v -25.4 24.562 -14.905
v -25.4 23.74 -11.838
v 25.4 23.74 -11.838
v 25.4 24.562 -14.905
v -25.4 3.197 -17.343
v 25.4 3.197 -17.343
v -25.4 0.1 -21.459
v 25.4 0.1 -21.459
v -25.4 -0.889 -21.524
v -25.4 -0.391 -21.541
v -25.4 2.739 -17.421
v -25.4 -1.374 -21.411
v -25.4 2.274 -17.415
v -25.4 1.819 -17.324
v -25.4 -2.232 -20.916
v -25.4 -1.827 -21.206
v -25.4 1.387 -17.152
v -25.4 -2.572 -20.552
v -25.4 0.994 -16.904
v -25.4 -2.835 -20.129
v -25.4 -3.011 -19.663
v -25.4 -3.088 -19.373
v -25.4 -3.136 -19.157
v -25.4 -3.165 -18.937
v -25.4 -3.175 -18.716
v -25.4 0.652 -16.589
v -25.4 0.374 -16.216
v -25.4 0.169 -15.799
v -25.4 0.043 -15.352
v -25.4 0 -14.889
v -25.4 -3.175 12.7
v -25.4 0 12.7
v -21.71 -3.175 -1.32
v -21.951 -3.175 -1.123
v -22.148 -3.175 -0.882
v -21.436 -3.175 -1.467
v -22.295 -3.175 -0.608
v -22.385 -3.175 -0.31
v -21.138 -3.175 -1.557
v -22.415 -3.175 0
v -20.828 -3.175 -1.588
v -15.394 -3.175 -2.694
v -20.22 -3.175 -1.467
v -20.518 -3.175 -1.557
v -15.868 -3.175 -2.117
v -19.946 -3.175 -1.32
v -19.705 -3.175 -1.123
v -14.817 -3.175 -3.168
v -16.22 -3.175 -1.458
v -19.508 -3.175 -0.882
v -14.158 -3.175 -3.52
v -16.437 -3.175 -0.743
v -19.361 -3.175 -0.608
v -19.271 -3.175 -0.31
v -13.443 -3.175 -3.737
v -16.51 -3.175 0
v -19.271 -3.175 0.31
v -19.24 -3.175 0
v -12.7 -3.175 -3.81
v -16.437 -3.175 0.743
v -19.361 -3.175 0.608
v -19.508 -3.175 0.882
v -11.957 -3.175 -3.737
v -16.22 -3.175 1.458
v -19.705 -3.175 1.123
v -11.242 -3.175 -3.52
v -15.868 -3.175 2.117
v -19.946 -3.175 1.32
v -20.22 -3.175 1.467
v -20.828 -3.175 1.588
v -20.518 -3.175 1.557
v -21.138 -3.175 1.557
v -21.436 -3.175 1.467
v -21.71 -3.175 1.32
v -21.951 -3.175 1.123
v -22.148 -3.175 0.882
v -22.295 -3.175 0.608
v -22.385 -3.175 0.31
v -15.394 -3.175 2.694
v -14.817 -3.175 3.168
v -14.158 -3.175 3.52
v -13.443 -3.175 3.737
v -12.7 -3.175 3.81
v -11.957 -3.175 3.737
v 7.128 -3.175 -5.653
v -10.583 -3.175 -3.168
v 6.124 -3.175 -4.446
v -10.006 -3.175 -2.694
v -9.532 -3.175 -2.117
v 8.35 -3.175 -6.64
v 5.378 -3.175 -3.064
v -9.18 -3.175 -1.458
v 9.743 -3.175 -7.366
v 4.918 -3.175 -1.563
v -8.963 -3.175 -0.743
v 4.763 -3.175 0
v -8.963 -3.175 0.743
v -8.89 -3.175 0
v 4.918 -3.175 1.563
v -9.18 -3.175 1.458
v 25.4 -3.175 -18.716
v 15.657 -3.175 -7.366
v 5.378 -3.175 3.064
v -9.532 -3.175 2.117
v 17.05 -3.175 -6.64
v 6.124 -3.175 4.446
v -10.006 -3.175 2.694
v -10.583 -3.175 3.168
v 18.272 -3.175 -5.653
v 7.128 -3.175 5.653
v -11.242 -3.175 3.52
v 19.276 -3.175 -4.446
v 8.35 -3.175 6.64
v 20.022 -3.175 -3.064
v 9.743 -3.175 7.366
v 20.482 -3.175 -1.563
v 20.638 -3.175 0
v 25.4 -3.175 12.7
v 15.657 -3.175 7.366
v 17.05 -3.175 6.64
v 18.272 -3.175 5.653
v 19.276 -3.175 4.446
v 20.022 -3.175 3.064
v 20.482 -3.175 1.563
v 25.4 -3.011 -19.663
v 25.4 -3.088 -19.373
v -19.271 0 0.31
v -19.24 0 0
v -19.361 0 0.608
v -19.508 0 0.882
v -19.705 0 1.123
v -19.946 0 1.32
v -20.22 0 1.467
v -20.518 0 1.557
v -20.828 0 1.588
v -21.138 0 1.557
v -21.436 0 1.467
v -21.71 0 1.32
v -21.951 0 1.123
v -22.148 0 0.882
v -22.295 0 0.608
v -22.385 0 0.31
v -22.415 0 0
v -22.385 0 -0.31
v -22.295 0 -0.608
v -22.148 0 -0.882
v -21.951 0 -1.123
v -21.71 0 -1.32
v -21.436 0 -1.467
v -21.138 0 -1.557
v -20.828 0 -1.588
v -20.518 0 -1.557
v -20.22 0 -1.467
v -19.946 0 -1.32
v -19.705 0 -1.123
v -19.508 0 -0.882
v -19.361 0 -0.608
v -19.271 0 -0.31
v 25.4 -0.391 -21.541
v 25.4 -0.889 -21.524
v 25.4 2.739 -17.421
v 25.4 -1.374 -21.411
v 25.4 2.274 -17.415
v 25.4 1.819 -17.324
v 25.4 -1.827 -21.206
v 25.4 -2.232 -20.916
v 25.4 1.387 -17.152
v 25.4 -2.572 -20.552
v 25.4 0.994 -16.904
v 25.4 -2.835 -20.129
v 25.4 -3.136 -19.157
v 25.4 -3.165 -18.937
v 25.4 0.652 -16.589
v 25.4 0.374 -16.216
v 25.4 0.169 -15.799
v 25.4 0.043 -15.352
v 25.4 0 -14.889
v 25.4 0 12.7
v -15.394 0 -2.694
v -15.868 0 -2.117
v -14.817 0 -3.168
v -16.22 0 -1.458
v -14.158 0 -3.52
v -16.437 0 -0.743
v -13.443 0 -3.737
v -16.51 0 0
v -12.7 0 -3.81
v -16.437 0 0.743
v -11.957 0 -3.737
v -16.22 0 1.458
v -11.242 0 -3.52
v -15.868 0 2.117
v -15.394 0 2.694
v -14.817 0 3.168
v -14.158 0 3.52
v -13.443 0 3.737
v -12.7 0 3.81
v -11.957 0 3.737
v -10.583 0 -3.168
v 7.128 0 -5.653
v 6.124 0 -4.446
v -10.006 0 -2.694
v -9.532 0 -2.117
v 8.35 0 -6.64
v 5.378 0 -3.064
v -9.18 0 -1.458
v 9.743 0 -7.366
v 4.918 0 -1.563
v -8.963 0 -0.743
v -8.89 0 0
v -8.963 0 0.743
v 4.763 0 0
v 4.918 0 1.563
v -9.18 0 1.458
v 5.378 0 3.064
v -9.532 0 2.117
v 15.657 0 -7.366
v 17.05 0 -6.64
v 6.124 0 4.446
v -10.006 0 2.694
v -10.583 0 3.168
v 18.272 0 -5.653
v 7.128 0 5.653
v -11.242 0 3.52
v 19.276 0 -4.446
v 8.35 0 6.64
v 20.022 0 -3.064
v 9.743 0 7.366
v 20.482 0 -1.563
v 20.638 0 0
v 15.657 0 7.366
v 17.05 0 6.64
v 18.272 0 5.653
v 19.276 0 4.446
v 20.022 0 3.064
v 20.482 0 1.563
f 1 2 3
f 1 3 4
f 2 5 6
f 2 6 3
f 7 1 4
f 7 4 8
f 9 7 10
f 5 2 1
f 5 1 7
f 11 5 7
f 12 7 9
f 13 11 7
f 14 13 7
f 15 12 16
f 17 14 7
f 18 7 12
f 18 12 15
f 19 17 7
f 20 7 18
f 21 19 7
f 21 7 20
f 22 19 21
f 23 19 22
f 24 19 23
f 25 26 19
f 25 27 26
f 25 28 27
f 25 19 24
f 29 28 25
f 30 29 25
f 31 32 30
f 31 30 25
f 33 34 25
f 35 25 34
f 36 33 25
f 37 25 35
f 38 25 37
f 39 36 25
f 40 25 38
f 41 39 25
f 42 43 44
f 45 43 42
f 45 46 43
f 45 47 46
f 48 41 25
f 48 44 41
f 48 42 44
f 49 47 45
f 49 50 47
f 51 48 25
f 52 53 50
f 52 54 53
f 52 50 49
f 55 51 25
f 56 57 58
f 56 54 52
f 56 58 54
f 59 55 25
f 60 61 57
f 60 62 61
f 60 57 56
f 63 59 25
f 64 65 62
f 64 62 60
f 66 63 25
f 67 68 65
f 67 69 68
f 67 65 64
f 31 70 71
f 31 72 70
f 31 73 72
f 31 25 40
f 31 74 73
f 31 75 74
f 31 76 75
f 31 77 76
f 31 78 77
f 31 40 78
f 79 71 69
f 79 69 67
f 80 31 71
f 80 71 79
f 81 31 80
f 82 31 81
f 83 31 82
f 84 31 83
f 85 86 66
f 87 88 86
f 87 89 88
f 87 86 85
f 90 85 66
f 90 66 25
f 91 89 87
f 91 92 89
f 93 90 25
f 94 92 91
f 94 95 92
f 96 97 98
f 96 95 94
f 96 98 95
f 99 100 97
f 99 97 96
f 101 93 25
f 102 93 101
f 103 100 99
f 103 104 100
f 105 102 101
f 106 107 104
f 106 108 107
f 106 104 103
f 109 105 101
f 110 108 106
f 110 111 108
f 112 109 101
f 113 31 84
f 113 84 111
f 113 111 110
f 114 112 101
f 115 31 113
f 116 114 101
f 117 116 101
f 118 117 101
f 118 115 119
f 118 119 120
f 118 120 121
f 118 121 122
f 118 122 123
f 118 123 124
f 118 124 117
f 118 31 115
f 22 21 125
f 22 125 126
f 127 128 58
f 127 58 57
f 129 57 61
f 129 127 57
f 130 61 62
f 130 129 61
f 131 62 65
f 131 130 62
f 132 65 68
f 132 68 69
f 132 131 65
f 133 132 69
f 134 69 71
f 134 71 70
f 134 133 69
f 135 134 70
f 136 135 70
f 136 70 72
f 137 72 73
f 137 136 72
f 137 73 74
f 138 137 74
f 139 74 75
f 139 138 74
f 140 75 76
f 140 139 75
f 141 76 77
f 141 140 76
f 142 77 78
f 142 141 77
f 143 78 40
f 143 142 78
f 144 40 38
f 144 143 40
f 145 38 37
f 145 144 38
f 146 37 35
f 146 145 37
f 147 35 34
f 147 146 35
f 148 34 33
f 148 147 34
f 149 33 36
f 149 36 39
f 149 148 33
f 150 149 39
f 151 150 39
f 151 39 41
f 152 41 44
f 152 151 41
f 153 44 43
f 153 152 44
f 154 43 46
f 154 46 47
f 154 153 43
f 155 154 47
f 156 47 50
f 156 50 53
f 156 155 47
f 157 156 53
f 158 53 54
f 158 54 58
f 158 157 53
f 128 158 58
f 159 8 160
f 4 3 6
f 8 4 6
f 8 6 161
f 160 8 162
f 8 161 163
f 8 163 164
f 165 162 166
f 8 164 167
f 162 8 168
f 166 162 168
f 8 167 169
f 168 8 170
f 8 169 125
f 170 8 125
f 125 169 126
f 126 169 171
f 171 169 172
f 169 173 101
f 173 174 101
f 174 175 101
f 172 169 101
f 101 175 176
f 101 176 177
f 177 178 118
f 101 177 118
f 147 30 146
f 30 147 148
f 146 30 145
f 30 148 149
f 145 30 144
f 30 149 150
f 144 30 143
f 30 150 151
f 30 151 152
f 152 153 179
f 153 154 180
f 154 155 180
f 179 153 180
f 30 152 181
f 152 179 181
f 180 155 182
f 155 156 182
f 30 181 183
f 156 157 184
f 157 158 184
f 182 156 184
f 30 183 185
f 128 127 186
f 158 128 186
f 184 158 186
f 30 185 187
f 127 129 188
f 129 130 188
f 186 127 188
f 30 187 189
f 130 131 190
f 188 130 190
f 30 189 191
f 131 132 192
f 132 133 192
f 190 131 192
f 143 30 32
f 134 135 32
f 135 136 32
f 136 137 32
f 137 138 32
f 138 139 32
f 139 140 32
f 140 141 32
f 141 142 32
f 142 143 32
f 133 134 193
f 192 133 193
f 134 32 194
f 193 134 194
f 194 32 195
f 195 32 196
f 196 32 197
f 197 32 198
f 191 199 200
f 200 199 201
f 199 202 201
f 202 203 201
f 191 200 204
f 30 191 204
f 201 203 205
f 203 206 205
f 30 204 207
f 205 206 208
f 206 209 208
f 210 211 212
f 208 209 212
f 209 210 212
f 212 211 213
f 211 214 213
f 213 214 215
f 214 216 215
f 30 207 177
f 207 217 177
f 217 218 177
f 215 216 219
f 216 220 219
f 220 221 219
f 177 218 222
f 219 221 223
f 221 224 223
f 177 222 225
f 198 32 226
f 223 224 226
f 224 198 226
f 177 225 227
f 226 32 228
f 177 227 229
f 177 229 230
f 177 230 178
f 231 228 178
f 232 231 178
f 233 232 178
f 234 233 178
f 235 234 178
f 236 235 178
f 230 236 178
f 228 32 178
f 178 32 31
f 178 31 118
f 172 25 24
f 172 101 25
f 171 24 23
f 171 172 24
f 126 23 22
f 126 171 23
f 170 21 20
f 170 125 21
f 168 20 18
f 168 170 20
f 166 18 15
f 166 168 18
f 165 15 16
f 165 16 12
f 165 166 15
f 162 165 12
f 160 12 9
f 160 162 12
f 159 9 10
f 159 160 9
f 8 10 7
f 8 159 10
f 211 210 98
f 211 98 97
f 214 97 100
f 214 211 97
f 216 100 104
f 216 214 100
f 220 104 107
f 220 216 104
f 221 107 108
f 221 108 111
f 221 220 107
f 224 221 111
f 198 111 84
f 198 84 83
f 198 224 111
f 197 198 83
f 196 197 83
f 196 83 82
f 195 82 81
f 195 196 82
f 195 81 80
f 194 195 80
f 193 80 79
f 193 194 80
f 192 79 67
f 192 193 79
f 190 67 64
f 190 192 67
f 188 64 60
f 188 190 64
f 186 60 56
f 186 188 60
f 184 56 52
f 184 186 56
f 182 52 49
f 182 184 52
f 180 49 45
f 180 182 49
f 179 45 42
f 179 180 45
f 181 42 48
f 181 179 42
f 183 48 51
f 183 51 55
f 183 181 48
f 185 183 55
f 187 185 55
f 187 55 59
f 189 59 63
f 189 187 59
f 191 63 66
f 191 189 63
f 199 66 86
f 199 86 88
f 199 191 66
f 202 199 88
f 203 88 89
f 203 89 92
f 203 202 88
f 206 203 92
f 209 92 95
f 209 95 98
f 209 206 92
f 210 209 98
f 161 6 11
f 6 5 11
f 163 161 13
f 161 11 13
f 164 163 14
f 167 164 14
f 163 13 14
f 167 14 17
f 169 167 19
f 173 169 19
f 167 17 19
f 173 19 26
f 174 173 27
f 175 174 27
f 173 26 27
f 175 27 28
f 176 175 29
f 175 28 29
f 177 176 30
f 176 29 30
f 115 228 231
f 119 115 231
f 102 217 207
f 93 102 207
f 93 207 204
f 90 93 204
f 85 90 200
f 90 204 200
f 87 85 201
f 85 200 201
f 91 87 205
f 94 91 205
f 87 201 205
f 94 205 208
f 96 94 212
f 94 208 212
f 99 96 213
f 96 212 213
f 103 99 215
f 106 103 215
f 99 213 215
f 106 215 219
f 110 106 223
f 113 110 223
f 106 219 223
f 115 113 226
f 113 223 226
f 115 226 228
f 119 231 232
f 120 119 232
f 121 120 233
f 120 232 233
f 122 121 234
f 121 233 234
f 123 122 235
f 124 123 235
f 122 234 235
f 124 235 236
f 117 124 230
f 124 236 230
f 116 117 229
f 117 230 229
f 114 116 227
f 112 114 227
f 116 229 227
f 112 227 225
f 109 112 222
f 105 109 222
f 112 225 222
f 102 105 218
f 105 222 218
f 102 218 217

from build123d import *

# Parameters (mm, degrees)
F0_W     = 50.8
F0_H     = 31.75
F0_R     = 1.5875
F0_R_2   = 3.81
F1_DEPTH = 3.175
F3_DEPTH = 50.8
F4_R     = 2.54
F5_R     = 2.54


with BuildPart() as f1:
    # F0 (on Front) → F1 (new body)
    with BuildSketch(Plane.XZ):
        with Locations((0, -3.175)):
            Rectangle(F0_W, F0_H)
        with Locations((-20.828, 0)):
            Circle(F0_R, mode=Mode.SUBTRACT)
        with Locations((-12.7, 0)):
            Circle(F0_R_2, mode=Mode.SUBTRACT)
        with BuildLine():
            ThreePointArc((9.7426447204, -7.366), (4.7625, 0), (9.7426447204, 7.366))
            Line((9.7426447204, 7.366), (15.6573552796, 7.366))
            ThreePointArc((15.6573552796, 7.366), (20.6375, 0), (15.6573552796, -7.366))
            Line((15.6573552796, -7.366), (9.7426447204, -7.366))
        make_face(mode=Mode.SUBTRACT)
    extrude(amount=F1_DEPTH)

    # F2 (on face) → F3 (join, through all)
    with BuildSketch(Plane(origin=(-25.4, 0, 0), x_dir=(0, -1, 0), z_dir=(-1, 0, 0))):
        Polygon((2.3532495318, -22.1168144985), (3.175, -19.05), (-23.7399423715, -11.8381629272), (-24.5616928397, -14.9049774257), align=None)
    extrude(amount=-F3_DEPTH)

    # F4
    f4_edges = [f1.edges().sort_by_distance(p)[0] for p in [
        (0, 0, -18.199261),
    ]]
    fillet(f4_edges, radius=F4_R)

    # F5
    f5_edges = [f1.edges().sort_by_distance(p)[0] for p in [
        (0, -2.35325, -22.116814),
        (0, -3.175, -19.05),
    ]]
    fillet(f5_edges, radius=F5_R)


solid = f1.part
